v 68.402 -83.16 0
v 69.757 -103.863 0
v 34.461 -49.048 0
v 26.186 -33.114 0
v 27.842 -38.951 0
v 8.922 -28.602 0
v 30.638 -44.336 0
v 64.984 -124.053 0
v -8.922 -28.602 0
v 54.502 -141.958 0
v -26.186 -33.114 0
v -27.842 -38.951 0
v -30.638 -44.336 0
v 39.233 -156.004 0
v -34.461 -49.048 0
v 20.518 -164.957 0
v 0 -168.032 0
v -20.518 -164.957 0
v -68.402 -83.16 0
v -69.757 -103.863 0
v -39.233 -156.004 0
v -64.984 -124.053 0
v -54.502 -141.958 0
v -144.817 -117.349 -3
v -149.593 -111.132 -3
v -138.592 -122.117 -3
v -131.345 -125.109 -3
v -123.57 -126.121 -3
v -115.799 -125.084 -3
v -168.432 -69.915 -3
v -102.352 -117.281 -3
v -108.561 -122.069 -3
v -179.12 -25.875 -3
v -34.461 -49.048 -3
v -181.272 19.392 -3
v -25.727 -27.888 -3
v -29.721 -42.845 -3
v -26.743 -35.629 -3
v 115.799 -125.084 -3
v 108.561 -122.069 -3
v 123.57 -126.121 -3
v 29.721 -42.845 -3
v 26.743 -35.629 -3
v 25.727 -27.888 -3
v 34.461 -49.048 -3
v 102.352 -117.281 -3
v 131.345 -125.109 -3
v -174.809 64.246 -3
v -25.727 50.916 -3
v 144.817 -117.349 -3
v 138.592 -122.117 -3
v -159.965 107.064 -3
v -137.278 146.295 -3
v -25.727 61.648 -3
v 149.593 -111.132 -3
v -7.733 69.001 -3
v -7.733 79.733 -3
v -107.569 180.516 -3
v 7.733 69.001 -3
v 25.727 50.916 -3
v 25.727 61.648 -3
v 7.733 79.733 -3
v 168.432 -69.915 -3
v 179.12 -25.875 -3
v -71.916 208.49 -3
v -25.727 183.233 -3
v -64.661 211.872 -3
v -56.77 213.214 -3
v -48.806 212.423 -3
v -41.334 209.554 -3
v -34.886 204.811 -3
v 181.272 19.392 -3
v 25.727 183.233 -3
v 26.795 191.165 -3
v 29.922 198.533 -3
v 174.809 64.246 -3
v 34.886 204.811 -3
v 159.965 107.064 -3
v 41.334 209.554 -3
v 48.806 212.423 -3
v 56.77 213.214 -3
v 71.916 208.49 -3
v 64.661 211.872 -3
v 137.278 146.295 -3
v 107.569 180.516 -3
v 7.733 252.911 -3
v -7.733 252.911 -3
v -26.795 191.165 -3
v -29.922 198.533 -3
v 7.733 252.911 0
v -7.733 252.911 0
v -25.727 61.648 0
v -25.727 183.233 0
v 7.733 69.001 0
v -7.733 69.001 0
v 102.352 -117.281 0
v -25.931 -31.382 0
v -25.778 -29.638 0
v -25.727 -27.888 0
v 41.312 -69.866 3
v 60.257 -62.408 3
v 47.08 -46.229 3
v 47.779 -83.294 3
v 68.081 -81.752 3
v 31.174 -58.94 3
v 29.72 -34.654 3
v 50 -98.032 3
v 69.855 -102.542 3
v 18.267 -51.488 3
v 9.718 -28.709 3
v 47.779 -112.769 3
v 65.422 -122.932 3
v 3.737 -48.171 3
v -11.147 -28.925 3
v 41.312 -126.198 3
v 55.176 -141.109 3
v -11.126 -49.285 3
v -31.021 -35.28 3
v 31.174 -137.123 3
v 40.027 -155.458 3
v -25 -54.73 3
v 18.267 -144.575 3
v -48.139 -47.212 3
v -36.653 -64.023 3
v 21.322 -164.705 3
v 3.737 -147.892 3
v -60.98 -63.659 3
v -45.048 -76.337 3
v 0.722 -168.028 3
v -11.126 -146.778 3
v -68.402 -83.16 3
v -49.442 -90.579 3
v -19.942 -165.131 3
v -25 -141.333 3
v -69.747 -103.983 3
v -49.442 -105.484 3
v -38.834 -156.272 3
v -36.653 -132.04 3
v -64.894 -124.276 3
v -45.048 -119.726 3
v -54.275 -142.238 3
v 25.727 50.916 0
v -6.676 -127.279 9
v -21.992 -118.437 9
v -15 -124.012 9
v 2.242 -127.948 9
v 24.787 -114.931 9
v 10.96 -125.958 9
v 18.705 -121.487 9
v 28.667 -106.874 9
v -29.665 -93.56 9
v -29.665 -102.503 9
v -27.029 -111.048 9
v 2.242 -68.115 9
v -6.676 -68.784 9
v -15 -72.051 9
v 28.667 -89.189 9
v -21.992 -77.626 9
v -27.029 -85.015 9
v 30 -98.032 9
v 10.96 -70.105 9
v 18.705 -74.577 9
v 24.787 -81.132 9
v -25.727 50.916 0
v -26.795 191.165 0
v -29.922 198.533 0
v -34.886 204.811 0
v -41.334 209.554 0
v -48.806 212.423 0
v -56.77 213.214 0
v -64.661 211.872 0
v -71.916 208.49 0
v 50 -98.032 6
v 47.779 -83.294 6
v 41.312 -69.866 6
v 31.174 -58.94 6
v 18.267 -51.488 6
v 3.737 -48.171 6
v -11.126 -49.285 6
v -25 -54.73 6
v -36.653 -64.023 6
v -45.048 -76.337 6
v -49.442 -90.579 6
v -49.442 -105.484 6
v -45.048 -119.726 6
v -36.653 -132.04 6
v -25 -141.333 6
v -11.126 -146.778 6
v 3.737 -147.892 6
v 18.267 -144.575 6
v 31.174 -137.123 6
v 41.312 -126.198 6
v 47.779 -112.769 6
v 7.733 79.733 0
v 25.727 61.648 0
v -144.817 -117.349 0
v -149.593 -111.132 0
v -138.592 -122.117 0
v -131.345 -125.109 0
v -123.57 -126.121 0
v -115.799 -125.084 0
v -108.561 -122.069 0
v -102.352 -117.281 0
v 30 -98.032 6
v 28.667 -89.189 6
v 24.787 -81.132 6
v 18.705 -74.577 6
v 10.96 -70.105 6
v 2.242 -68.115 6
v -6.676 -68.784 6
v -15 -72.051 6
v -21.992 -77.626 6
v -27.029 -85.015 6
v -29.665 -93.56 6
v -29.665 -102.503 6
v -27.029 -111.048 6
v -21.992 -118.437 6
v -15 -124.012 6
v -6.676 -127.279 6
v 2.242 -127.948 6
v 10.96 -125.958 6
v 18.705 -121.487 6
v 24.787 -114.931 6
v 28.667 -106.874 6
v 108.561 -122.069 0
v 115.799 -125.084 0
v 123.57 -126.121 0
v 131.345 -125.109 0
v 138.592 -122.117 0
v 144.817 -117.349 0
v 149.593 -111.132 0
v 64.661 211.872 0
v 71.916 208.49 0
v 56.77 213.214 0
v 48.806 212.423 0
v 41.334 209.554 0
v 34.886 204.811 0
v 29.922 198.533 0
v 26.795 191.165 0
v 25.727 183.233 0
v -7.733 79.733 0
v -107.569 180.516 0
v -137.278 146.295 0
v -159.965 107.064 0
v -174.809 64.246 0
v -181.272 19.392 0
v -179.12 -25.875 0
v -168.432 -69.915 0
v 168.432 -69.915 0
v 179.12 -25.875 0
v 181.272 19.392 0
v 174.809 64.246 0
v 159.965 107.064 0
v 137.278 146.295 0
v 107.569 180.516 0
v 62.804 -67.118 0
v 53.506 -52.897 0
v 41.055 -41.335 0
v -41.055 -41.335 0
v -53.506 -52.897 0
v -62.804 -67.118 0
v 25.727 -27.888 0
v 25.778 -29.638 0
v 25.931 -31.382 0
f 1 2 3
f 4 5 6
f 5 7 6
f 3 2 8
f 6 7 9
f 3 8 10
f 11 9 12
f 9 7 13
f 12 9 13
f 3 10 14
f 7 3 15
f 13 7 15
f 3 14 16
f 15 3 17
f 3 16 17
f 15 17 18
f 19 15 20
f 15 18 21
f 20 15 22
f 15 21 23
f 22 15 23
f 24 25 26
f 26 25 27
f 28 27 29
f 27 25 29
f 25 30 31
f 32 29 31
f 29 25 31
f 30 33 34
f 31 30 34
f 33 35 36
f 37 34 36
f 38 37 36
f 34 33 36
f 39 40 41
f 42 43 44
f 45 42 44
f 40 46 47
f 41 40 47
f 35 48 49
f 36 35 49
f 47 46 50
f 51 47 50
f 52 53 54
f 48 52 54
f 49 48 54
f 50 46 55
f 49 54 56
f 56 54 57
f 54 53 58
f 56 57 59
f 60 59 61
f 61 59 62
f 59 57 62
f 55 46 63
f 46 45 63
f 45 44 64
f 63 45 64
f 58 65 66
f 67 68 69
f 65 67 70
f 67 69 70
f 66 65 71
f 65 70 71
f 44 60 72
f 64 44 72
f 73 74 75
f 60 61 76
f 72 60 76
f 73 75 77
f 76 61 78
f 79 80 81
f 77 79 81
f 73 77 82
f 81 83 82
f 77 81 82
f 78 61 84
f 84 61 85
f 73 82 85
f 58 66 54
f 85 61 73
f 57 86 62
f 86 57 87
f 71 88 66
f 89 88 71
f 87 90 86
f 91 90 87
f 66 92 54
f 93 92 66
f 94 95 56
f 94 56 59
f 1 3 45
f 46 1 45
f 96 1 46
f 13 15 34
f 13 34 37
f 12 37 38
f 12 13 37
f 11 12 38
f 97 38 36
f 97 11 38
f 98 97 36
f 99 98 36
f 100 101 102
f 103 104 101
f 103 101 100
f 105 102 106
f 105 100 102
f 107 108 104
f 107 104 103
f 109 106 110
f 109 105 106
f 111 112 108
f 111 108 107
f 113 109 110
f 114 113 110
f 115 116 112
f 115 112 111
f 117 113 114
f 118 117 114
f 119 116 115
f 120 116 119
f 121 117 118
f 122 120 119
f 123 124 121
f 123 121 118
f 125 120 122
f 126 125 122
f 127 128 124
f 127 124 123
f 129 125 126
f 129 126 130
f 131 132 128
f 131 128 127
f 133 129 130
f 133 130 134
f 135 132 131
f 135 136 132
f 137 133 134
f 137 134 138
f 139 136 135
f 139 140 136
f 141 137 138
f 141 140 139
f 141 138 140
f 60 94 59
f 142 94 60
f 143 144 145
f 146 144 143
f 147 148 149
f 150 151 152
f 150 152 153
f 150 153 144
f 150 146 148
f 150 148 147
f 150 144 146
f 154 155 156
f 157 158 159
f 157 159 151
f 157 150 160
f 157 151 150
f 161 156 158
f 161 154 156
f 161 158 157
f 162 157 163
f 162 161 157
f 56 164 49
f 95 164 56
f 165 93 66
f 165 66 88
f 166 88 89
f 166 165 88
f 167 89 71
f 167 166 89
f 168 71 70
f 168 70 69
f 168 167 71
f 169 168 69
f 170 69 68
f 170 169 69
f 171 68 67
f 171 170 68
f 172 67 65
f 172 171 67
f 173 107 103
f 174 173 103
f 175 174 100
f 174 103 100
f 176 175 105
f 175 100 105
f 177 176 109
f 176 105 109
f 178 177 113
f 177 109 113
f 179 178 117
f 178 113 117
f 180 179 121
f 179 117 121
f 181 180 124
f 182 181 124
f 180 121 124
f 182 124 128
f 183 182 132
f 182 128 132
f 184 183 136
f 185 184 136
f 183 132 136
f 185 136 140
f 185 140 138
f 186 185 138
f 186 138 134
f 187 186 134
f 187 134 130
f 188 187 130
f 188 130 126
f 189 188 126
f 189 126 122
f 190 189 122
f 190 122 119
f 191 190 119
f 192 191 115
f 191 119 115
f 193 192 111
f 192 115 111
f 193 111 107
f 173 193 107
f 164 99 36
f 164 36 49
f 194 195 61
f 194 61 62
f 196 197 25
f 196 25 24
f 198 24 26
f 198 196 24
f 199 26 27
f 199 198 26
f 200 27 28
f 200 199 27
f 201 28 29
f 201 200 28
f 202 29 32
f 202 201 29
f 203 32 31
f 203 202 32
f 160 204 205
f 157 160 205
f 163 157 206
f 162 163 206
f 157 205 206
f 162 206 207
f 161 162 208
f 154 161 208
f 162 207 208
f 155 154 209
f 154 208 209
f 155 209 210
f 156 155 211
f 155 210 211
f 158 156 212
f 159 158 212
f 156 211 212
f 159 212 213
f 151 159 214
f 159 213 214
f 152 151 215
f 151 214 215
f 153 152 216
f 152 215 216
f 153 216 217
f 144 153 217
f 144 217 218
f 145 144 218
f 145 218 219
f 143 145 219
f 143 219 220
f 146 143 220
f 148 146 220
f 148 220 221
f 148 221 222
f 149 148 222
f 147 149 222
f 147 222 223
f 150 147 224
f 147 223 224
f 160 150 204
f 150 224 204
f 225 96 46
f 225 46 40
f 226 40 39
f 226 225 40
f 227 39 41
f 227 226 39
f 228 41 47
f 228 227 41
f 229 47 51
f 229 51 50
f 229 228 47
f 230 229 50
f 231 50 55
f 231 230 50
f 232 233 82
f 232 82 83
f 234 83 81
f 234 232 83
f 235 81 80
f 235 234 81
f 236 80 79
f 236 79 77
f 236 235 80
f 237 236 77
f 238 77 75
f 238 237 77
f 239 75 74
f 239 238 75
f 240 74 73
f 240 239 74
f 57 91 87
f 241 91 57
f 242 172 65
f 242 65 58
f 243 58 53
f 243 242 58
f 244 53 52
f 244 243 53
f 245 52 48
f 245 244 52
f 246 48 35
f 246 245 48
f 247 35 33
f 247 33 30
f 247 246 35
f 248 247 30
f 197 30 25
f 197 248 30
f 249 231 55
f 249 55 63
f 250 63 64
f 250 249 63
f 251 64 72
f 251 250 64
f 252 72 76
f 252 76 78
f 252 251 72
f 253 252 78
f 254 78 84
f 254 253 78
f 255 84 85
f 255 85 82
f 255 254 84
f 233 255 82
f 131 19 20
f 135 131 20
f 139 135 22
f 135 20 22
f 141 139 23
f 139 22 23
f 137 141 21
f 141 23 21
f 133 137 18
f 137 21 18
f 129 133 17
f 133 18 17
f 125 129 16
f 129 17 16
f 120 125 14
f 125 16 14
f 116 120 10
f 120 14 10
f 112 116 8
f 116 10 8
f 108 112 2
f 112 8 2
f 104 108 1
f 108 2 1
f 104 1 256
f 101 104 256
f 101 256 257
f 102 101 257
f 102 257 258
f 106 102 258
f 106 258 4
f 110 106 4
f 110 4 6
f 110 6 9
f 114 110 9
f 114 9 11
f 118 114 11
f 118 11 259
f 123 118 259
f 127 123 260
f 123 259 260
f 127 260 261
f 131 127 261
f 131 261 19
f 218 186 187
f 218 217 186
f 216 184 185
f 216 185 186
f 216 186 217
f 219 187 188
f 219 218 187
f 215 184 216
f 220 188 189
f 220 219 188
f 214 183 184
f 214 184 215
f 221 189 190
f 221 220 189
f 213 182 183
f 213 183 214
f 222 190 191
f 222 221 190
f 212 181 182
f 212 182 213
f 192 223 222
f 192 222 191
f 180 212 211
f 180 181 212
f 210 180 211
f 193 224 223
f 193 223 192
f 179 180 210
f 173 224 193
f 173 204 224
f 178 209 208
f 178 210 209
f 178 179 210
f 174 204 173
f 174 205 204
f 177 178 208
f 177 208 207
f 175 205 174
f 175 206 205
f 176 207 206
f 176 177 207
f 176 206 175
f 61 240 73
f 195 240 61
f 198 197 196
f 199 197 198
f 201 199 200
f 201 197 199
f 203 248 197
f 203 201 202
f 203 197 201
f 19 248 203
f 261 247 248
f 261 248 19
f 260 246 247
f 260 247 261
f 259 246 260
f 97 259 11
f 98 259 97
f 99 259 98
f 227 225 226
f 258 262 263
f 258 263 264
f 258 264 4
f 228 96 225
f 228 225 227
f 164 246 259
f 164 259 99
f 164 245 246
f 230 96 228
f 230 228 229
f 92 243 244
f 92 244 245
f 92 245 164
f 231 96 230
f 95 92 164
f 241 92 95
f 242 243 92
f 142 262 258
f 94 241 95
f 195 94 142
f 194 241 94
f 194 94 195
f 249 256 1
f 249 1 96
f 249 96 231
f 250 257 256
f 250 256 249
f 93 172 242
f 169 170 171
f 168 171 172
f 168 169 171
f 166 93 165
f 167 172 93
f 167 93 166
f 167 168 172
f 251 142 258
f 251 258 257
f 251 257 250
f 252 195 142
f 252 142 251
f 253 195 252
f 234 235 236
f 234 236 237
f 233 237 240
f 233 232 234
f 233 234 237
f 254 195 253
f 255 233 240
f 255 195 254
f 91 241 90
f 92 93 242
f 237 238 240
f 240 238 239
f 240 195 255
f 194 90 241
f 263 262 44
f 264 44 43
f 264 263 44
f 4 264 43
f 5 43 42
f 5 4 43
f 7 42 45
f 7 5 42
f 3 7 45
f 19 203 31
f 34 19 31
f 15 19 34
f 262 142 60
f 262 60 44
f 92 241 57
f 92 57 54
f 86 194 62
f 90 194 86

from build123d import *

# Parameters (mm, degrees)
BOSS_EXTRUDE2_DEPTH = 3
SKETCH4_R           = 70
BOSS_EXTRUDE3_DEPTH = 3
SKETCH5_R           = 50
BOSS_EXTRUDE4_DEPTH = 3
SKETCH6_R           = 30
BOSS_EXTRUDE5_DEPTH = 3


with BuildPart() as part:
    # Sketch3 → Boss-Extrude2 (new body)
    with BuildSketch(Plane.XY):
        with BuildLine():
            Line((-7.732951968, 171.945409862), (-7.732951968, 79.732573414))
            Line((-7.732951968, 79.732573414), (-25.727277728, 61.647728335))
            Line((-25.727277728, 61.647728335), (-25.727277728, 183.232578721))
            ThreePointArc((-25.727277728, 183.232578721), (-41.33367569, 209.554133014), (-71.915559085, 208.490043889))
            ThreePointArc((-71.915559085, 208.490043889), (-174.808712355, 64.246349724), (-149.59307925, -111.131574039))
            ThreePointArc((-149.59307925, -111.131574039), (-127.490841861, -125.869970667), (-102.352099339, -117.280857953))
            Line((-102.352099339, -117.280857953), (-34.460919249, -49.048155569))
            ThreePointArc((-34.460919249, -49.048155569), (-27.996511832, -39.333965794), (-25.727277728, -27.888240705))
            Line((-25.727277728, -27.888240705), (-25.727277728, 50.916062024))
            Line((-25.727277728, 50.916062024), (-7.732951969, 69.000907103))
            Line((-7.732951969, 69.000907103), (7.732951969, 69.000907103))
            Line((7.732951969, 69.000907103), (25.727277728, 50.916062024))
            Line((25.727277728, 50.916062024), (25.727277728, -27.888240705))
            ThreePointArc((25.727277728, -27.888240705), (27.996511832, -39.333965794), (34.460919249, -49.048155569))
            Line((34.460919249, -49.048155569), (102.352099339, -117.280857953))
            ThreePointArc((102.352099339, -117.280857953), (127.490841861, -125.869970667), (149.59307925, -111.131574039))
            ThreePointArc((149.59307925, -111.131574039), (174.808712355, 64.246349724), (71.915559085, 208.490043889))
            ThreePointArc((71.915559085, 208.490043889), (41.33367569, 209.554133014), (25.727277728, 183.232578721))
            Line((25.727277728, 183.232578721), (25.727277728, 61.647728335))
            Line((25.727277728, 61.647728335), (7.732951968, 79.732573414))
            Line((7.732951968, 79.732573414), (7.732951968, 171.945409862))
            Line((7.732951968, 171.945409862), (7.732951968, 252.911456322))
            Line((7.732951968, 252.911456322), (-7.732951968, 252.911456322))
            Line((-7.732951968, 252.911456322), (-7.732951968, 171.945409862))
        make_face()
    extrude(amount=-BOSS_EXTRUDE2_DEPTH)

    # Sketch4 → Boss-Extrude3 (add)
    with BuildSketch(Plane.XY):
        with Locations(Location((0, -98.03156951, 0), (0, 0, 167.733969659))):
            Circle(SKETCH4_R)
    extrude(amount=BOSS_EXTRUDE3_DEPTH)

    # Sketch5 → Boss-Extrude4 (add)
    with BuildSketch(Plane.XY.offset(3)):
        with Locations((0, -98.03156951)):
            Circle(SKETCH5_R)
    extrude(amount=BOSS_EXTRUDE4_DEPTH)

    # Sketch6 → Boss-Extrude5 (add)
    with BuildSketch(Plane.XY.offset(6)):
        with Locations((0, -98.03156951)):
            Circle(SKETCH6_R)
    extrude(amount=BOSS_EXTRUDE5_DEPTH)


solid = part.part
